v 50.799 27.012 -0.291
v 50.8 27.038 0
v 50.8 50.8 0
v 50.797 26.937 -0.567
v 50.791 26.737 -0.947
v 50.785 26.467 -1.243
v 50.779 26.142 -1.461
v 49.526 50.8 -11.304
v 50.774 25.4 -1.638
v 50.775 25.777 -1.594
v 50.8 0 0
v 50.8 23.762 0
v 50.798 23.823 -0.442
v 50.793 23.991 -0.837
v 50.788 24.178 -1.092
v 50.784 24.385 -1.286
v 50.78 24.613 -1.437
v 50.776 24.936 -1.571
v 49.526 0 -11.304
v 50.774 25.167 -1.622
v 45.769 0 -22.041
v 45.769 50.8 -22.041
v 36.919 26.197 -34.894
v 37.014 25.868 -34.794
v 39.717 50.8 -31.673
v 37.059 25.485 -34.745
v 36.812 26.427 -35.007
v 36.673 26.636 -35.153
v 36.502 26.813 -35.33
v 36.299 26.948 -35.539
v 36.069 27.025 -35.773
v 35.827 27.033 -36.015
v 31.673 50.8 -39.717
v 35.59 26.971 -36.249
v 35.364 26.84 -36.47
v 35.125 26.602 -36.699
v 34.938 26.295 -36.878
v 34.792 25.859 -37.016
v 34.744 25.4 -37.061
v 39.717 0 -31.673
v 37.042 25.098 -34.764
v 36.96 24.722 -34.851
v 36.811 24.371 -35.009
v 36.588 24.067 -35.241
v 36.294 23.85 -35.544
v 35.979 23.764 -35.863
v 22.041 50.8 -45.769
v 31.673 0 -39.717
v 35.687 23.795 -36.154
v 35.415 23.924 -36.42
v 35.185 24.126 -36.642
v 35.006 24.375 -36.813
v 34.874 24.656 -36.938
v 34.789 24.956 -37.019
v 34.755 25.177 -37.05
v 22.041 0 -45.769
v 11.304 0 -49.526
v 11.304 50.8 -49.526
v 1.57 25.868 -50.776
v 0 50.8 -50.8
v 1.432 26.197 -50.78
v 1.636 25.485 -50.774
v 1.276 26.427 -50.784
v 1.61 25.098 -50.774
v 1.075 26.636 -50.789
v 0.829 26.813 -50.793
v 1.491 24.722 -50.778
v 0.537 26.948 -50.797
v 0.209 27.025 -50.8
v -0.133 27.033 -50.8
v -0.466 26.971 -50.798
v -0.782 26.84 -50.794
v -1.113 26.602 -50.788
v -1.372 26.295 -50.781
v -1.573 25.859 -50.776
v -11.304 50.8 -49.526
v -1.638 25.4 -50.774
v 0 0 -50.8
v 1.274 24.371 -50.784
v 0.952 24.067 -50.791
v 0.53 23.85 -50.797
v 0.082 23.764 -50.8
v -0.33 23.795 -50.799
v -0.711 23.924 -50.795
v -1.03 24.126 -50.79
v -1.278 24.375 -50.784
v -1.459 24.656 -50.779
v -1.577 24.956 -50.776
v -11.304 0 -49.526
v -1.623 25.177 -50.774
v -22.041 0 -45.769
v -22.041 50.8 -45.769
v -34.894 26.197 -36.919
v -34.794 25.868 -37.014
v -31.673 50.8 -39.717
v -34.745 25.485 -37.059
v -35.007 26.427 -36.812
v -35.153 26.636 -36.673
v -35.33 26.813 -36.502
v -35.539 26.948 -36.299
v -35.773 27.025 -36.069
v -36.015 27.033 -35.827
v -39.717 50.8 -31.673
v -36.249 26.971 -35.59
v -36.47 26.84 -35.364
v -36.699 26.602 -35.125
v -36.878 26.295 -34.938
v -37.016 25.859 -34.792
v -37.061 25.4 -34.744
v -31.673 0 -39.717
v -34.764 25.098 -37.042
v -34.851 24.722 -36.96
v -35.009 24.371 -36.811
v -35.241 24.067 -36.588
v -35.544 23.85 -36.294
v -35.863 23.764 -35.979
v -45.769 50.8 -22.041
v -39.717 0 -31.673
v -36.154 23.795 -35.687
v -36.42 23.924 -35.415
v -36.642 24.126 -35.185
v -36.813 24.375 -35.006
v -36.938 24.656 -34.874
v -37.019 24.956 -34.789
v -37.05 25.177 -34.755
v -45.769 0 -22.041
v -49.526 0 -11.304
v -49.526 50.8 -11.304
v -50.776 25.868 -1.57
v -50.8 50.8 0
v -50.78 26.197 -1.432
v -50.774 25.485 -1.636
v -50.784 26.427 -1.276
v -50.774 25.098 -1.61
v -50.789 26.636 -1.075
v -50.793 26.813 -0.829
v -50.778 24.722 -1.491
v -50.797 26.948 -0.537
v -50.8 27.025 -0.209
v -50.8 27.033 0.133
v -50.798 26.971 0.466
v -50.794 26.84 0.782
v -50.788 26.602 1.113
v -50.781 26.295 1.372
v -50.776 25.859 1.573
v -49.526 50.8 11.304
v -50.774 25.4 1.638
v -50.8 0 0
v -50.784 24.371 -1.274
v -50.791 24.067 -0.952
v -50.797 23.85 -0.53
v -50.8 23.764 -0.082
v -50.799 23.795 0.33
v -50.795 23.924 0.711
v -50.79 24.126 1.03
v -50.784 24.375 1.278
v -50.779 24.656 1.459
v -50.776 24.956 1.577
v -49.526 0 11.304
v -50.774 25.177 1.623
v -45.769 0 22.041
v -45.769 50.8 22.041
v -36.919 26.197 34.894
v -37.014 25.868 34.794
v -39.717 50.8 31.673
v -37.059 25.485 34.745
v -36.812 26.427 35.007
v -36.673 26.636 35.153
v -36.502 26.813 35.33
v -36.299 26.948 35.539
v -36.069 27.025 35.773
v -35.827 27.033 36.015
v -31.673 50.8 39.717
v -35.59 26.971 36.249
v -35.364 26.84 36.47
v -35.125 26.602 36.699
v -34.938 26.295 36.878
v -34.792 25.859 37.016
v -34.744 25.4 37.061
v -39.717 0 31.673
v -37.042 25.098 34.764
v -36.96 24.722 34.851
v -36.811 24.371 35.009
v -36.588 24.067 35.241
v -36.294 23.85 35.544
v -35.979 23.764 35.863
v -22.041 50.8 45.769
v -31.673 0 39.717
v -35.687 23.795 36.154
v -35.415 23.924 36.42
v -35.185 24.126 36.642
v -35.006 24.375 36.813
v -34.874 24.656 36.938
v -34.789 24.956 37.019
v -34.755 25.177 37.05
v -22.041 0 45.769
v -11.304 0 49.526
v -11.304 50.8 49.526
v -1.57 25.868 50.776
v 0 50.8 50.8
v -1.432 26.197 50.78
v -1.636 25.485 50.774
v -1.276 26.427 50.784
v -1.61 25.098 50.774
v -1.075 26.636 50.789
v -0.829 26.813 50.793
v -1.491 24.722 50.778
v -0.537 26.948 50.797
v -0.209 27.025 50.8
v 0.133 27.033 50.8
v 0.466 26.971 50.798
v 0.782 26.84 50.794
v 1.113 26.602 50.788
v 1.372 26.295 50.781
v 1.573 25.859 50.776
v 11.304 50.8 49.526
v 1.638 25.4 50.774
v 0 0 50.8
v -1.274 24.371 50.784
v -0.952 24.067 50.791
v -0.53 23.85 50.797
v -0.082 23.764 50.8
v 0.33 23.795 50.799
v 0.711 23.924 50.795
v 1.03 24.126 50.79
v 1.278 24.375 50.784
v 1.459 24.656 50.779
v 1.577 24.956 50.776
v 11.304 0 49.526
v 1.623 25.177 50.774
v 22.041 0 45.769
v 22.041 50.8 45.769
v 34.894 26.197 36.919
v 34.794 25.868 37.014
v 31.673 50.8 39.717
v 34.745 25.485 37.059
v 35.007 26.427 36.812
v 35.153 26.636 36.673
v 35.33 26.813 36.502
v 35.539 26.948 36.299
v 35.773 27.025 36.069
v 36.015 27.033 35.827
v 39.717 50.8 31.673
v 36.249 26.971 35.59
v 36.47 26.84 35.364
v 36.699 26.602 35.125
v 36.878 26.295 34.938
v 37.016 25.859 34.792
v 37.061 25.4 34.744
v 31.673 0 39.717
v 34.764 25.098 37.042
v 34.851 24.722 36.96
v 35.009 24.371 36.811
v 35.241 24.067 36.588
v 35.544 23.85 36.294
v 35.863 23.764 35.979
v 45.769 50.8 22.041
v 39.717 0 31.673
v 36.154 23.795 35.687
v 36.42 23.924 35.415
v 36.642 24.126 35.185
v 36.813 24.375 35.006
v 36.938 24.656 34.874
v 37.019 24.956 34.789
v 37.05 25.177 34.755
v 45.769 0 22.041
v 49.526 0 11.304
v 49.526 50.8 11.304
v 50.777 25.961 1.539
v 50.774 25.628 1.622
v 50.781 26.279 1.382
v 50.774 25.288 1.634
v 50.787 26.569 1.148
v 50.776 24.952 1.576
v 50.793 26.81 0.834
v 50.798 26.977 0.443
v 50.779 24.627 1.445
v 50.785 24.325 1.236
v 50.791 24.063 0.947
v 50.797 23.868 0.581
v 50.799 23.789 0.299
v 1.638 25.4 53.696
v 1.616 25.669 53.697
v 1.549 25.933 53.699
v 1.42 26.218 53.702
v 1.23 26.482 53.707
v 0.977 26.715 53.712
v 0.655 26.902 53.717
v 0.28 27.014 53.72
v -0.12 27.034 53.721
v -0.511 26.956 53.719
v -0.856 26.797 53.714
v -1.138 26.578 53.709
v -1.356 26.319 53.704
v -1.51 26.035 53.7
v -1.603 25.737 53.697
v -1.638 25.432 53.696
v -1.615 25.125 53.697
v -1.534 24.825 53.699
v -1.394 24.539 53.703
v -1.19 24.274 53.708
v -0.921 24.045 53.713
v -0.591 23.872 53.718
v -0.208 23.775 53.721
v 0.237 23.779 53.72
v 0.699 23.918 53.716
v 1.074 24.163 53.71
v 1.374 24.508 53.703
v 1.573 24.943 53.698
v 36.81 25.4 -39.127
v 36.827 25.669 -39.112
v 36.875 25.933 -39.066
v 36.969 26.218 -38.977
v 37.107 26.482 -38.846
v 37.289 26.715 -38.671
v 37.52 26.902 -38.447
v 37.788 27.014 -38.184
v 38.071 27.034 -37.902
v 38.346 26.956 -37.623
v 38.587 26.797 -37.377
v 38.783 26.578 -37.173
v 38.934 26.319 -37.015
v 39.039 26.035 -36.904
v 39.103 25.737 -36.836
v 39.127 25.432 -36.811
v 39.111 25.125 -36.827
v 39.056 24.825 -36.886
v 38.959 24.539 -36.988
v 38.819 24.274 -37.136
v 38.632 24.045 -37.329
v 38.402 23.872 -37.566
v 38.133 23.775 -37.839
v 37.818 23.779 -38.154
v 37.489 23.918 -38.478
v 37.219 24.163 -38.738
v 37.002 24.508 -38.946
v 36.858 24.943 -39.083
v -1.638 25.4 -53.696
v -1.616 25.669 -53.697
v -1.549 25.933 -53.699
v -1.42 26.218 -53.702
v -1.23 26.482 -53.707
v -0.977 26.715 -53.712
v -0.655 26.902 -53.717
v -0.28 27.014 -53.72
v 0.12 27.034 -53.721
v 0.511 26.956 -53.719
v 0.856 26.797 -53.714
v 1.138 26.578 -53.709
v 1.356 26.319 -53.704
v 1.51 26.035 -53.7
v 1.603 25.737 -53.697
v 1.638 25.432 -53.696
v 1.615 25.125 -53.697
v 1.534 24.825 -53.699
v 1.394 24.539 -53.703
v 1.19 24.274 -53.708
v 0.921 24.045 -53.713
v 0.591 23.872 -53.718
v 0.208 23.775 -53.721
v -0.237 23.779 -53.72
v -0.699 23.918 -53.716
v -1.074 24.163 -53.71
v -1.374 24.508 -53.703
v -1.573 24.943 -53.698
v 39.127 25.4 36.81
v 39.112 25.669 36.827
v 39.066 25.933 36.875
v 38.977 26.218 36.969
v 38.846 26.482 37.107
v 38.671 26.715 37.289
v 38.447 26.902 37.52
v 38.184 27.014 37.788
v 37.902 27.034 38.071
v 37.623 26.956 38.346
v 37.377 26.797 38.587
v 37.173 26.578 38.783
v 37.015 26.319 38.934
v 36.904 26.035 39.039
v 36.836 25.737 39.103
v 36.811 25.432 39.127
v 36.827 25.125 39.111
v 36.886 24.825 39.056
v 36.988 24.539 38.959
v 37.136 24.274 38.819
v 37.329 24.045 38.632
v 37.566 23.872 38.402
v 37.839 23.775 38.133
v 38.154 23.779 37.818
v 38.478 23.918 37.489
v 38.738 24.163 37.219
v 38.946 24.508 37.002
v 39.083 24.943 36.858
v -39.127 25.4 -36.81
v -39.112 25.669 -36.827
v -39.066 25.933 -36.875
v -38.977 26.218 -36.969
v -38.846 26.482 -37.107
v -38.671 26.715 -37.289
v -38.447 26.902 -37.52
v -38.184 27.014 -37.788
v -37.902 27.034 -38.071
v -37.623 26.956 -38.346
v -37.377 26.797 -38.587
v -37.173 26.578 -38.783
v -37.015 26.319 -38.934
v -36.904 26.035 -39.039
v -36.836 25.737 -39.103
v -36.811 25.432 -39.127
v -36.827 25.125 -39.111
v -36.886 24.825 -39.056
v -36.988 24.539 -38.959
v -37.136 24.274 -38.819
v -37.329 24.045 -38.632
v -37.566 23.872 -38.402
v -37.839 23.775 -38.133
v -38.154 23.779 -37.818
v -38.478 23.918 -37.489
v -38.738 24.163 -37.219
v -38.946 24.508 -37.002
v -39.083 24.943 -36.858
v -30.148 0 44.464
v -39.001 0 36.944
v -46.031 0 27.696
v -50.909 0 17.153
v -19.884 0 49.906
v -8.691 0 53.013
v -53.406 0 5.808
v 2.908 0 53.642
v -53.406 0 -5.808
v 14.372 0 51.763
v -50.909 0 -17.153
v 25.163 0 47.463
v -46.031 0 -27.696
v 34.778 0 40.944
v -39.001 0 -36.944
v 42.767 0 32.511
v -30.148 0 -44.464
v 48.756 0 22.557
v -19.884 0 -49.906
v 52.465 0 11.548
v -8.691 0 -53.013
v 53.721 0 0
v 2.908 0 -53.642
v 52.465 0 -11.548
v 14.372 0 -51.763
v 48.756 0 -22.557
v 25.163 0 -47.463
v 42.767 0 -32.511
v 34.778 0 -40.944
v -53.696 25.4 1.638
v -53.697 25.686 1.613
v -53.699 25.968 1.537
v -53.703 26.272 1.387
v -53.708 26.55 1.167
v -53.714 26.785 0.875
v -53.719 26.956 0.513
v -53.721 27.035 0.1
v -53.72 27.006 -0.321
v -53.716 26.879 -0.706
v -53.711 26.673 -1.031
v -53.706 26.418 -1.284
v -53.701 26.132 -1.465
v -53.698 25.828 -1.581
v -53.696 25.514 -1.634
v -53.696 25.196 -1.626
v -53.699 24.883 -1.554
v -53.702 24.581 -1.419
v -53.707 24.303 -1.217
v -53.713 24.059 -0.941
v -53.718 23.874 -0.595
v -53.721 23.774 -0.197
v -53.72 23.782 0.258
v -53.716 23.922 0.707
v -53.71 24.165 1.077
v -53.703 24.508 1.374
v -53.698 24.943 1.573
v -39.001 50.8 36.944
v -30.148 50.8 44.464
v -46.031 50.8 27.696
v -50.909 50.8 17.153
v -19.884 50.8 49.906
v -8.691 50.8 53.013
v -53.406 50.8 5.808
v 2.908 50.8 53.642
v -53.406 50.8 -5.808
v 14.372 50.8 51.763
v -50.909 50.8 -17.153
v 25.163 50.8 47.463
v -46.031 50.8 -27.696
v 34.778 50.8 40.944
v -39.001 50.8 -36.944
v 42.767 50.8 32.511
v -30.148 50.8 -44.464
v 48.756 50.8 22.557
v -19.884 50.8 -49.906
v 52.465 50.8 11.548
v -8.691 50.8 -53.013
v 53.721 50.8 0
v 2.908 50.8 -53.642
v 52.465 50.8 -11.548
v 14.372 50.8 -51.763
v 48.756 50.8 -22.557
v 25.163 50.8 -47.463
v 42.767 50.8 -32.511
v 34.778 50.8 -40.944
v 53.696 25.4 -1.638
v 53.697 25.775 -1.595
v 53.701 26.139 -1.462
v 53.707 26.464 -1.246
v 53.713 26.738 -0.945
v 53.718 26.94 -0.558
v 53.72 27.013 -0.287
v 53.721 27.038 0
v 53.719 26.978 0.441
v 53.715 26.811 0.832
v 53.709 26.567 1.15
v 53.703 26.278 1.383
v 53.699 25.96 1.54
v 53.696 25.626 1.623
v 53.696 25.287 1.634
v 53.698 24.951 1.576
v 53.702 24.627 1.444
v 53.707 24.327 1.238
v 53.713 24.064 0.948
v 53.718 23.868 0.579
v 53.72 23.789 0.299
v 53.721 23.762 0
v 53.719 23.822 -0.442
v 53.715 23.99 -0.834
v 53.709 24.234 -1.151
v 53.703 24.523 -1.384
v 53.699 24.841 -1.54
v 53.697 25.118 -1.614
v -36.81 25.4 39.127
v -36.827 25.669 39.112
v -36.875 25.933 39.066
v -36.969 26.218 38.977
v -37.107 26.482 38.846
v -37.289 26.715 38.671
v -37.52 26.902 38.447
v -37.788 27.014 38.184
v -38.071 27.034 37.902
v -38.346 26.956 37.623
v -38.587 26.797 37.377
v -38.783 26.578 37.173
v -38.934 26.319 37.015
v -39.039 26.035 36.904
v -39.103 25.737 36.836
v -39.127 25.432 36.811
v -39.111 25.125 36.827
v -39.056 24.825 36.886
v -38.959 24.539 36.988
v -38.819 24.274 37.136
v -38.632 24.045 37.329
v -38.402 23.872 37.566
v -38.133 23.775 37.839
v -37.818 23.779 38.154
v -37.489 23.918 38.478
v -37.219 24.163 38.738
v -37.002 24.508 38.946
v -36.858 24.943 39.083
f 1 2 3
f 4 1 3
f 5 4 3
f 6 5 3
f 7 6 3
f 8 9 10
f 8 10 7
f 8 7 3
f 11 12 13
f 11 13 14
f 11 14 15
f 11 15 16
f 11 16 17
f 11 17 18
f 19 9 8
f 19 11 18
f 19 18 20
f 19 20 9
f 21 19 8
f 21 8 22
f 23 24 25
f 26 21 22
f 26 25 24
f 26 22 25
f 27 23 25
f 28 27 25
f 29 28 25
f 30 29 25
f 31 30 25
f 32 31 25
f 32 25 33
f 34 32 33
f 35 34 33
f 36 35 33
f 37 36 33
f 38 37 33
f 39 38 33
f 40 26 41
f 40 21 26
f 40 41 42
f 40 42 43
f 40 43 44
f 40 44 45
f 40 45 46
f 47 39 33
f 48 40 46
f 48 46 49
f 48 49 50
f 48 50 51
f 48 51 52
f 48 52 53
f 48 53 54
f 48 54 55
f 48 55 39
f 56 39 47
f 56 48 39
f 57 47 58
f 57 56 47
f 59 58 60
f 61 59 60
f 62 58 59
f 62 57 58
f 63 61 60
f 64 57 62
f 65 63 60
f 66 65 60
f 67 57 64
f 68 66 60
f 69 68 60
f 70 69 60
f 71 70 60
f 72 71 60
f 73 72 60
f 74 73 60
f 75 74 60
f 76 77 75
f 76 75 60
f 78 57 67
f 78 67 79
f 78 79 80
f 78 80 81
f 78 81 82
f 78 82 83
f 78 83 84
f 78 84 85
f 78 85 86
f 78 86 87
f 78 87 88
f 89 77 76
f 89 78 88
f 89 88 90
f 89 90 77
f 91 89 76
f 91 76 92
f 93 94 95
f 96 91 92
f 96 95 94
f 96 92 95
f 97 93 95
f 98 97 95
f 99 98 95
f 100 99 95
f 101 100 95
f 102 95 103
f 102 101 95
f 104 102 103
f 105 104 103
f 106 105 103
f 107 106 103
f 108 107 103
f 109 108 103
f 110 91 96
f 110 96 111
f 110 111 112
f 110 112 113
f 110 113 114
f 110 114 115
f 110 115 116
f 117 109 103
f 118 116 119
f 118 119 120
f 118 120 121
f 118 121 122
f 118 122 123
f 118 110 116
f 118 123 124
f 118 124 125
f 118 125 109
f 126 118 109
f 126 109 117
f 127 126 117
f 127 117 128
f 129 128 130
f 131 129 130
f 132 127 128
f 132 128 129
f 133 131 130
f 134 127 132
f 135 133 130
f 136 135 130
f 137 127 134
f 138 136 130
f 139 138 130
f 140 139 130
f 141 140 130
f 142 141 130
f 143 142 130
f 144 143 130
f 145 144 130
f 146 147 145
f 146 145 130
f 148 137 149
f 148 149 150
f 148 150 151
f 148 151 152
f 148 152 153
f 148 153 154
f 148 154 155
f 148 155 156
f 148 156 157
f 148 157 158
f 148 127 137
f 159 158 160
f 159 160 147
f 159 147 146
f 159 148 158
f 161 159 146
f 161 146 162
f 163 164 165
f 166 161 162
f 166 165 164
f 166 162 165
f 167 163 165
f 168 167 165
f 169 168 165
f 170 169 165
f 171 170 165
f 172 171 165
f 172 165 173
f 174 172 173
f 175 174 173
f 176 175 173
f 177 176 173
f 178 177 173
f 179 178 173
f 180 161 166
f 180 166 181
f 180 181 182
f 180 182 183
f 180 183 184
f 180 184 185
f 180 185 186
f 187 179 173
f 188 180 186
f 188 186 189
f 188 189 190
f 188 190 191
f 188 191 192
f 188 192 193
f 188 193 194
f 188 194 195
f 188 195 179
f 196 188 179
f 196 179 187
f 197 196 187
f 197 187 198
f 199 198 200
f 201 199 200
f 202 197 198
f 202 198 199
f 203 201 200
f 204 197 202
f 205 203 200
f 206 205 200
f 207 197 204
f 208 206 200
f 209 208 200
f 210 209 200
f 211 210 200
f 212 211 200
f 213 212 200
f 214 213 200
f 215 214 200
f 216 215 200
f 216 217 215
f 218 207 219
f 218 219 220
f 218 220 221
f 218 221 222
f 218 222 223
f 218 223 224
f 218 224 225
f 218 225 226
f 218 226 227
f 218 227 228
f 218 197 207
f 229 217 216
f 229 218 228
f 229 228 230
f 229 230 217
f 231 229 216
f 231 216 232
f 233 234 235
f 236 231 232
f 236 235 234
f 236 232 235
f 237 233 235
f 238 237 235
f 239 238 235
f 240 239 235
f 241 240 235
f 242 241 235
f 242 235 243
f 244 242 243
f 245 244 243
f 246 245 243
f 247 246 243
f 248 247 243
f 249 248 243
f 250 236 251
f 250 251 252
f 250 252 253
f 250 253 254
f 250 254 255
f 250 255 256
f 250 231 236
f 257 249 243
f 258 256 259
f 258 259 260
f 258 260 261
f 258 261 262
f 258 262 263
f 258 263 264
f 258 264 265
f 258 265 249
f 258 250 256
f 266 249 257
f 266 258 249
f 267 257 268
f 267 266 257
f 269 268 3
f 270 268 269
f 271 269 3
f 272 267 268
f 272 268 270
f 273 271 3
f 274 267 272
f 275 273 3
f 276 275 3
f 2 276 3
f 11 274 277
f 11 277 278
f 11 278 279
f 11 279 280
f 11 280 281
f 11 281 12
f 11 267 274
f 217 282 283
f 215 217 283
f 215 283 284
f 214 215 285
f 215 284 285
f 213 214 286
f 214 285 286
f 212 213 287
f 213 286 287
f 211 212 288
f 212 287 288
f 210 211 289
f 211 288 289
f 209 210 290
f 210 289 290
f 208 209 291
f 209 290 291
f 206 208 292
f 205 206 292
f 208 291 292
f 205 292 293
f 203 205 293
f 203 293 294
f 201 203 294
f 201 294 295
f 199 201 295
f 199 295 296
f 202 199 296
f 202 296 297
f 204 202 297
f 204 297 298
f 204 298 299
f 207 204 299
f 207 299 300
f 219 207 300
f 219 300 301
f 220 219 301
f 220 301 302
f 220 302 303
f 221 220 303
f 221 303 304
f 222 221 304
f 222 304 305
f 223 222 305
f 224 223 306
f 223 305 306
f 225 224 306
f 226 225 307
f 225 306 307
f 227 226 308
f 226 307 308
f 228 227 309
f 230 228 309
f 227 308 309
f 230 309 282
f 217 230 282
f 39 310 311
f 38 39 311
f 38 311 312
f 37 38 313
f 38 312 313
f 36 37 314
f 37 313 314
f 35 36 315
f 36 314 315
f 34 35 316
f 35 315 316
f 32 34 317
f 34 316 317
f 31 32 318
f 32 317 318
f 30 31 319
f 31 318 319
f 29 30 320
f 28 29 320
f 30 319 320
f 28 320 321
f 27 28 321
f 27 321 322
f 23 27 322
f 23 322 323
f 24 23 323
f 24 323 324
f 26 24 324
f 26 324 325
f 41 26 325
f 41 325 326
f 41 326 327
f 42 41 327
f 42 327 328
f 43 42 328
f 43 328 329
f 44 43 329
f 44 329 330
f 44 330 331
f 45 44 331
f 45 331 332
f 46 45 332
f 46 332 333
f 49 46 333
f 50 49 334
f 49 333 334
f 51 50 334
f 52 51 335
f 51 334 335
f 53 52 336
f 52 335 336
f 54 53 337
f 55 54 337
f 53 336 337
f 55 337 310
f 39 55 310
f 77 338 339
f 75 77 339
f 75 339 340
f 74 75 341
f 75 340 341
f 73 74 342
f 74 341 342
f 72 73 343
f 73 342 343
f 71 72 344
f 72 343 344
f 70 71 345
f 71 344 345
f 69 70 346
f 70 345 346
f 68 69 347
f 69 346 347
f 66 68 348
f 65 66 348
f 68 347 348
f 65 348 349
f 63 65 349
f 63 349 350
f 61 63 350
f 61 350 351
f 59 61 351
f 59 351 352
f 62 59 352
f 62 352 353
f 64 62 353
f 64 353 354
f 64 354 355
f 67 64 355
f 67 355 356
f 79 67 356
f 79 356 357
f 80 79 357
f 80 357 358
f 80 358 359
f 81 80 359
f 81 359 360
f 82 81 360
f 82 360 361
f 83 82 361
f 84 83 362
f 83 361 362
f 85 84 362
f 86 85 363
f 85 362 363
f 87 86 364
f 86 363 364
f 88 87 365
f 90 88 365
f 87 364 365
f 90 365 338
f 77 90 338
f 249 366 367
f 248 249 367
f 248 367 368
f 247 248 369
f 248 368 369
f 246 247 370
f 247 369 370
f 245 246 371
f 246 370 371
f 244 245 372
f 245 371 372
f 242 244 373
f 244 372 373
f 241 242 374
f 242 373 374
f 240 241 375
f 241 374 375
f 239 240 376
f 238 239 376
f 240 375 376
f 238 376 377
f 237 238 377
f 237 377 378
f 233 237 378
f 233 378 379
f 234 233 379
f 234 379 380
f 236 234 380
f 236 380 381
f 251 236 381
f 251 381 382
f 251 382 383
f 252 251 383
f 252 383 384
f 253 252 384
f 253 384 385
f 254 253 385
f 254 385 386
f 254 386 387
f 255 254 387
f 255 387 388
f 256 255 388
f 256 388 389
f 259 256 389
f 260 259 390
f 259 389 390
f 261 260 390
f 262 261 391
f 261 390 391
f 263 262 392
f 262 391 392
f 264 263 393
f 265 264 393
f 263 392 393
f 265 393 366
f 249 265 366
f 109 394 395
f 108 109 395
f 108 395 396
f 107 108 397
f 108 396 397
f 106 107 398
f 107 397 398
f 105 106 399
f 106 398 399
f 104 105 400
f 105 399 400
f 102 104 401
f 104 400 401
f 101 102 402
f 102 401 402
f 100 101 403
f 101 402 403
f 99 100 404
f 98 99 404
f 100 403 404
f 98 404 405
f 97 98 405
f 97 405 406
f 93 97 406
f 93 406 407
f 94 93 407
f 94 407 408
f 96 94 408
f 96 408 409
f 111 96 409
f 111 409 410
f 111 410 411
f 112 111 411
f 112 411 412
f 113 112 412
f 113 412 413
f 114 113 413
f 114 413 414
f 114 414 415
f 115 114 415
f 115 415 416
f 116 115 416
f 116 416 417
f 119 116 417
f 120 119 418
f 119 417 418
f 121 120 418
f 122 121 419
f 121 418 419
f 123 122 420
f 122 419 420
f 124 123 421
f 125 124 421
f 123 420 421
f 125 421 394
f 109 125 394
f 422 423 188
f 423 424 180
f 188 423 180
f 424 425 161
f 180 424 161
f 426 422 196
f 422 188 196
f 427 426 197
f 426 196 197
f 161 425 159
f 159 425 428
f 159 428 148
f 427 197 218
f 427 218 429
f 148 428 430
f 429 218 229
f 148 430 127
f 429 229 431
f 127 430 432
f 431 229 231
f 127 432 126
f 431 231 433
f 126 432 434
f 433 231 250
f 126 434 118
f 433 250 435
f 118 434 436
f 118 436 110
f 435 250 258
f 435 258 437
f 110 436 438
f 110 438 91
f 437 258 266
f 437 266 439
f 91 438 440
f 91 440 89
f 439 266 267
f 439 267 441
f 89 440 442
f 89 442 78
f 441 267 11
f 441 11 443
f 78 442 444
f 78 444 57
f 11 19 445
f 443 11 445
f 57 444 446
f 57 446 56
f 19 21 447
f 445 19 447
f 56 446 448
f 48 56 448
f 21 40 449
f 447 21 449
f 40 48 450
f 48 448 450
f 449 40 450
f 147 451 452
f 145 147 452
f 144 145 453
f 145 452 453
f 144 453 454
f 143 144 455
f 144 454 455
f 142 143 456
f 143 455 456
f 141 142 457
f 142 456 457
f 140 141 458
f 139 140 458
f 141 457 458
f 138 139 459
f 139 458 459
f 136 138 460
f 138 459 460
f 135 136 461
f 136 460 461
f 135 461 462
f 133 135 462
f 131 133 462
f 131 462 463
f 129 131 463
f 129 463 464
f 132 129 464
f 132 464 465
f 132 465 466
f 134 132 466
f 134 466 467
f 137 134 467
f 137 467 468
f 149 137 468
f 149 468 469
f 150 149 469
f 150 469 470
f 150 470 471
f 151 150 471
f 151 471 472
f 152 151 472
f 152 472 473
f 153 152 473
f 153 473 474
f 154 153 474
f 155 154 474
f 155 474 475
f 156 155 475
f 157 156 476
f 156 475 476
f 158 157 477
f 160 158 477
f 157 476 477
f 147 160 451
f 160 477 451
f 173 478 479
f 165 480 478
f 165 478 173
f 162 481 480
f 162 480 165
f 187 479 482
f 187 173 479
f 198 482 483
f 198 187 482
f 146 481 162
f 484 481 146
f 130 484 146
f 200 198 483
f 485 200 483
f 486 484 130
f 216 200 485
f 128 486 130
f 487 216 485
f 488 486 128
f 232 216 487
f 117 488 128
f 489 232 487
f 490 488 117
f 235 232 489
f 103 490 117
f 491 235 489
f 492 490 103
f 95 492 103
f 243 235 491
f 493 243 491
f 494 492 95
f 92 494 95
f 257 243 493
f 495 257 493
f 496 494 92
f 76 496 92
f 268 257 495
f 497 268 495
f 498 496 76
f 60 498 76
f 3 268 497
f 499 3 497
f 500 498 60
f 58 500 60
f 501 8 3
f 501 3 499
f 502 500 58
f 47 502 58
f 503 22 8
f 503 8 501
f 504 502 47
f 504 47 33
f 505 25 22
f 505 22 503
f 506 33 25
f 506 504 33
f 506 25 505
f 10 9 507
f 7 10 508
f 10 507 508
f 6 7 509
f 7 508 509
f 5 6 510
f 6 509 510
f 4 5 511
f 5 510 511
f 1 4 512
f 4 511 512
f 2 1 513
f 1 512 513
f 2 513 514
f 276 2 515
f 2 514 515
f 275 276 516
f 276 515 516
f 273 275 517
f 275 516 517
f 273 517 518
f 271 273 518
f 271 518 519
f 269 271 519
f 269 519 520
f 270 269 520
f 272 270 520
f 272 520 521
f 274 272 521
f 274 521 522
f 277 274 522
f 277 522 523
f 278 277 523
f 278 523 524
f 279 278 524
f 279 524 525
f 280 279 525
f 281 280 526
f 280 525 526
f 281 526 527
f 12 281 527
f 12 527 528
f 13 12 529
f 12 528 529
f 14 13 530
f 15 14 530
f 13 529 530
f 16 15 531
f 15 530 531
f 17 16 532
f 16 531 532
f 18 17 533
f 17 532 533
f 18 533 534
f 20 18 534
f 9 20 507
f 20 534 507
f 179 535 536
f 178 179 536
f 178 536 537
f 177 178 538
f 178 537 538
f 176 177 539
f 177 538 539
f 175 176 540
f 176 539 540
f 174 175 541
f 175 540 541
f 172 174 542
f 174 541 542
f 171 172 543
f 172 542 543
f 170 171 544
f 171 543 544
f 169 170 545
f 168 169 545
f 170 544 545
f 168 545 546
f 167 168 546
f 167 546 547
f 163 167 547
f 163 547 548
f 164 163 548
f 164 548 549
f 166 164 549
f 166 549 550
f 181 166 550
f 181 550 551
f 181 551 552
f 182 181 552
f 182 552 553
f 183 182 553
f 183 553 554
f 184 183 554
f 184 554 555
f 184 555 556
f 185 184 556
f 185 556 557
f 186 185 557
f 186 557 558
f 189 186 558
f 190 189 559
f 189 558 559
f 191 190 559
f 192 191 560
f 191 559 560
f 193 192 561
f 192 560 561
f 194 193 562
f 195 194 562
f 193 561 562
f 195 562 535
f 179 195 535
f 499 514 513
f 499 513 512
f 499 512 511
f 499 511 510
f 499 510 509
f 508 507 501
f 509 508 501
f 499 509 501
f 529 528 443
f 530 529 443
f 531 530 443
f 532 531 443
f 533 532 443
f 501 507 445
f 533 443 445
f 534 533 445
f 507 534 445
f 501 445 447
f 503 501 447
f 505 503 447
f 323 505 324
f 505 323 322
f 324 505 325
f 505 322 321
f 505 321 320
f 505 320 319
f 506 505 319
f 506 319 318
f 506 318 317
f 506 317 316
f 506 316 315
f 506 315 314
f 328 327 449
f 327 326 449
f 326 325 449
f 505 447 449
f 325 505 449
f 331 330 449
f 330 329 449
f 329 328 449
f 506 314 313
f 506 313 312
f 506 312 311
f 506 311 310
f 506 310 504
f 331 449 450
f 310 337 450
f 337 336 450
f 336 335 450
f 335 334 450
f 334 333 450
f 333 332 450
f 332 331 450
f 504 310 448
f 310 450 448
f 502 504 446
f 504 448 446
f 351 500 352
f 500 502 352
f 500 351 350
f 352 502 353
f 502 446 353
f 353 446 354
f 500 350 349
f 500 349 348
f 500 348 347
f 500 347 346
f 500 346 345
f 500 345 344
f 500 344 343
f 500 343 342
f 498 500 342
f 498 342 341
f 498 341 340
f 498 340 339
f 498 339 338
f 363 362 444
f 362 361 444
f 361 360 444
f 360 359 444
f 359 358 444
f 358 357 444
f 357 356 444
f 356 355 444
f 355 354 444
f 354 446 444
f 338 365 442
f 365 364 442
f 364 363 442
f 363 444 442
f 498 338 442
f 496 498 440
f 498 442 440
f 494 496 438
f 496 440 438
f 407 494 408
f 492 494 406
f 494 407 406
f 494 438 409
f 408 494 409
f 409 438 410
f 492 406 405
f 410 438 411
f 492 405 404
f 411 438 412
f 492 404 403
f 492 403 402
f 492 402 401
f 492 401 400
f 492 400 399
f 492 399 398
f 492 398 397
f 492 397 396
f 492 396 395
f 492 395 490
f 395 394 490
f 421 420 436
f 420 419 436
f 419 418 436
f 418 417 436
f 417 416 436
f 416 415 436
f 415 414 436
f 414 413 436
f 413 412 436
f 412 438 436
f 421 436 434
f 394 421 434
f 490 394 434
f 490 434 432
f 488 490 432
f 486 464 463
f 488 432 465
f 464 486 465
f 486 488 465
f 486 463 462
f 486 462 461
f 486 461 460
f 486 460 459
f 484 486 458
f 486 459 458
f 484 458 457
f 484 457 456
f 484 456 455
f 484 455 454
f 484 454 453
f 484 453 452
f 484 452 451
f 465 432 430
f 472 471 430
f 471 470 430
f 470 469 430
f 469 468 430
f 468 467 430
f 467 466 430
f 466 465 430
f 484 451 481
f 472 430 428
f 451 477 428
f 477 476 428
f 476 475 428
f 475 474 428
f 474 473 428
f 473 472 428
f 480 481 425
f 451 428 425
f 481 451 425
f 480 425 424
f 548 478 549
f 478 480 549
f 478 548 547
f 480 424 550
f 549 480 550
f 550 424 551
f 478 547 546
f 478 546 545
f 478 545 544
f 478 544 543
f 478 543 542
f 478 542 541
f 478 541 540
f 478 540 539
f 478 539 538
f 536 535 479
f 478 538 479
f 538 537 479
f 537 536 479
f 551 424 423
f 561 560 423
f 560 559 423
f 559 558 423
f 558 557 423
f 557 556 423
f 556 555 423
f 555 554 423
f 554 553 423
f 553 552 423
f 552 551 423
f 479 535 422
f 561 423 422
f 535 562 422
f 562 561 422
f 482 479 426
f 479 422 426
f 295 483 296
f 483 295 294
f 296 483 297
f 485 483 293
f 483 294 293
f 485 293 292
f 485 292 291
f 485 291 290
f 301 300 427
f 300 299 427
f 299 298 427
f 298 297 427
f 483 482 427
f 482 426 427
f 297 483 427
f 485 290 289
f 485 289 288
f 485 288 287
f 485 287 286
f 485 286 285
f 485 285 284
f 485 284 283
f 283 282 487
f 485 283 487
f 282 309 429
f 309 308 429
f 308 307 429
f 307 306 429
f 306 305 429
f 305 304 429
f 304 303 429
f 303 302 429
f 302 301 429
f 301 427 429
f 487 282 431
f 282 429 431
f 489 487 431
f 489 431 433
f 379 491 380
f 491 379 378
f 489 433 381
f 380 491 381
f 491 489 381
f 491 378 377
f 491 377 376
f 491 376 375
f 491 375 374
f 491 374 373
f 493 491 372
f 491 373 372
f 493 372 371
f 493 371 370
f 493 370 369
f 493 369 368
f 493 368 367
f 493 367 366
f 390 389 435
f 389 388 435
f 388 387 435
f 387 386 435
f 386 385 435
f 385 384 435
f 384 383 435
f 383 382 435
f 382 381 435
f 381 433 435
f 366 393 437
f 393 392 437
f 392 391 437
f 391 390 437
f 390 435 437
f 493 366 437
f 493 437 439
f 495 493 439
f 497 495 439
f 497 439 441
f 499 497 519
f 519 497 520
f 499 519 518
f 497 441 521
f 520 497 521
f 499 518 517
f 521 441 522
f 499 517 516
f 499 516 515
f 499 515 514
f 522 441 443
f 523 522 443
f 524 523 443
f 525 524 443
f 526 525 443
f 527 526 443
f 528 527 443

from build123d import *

# Parameters (mm, degrees)
SKETCH1_R               = 53.721
SKETCH1_R_2             = 50.8
EXTRUDE_THIN1_DEPTH     = 50.8
CUT_EXTRUDE1_REACH      = 132.424
CUT_EXTRUDE1_END_RADIUS = 50.8
SKETCH2_R               = 1.6383
CIRPATTERN1_COUNT       = 8


with BuildPart() as part:
    # Sketch1 → Extrude-Thin1 (new body)
    with BuildSketch(Plane(origin=(0, 0, 0), x_dir=(1, 0, 0), z_dir=(0, 1, 0))):
        Circle(SKETCH1_R)
        Circle(SKETCH1_R_2, mode=Mode.SUBTRACT)
    extrude(amount=EXTRUDE_THIN1_DEPTH)

    # Cut-Extrude1: up to this cylinder (the profile starts outside it)
    cut_extrude1_end = Plane(origin=(0, 25.4, 0), z_dir=(0, -1, 0)) * Cylinder(CUT_EXTRUDE1_END_RADIUS, 367.448, mode=Mode.PRIVATE)
    # Sketch2 → Cut-Extrude1 (cut, up to the surface)
    with BuildSketch(Plane.XY.offset(53.721), mode=Mode.PRIVATE) as cut_extrude1_sk1:
        with Locations((0, 25.4)):
            Circle(SKETCH2_R)
    cut_extrude1_tool1 = extrude(cut_extrude1_sk1.sketch, amount=-CUT_EXTRUDE1_REACH, mode=Mode.PRIVATE) - cut_extrude1_end
    cut_extrude1 = cut_extrude1_tool1.solids().sort_by_distance((0, 25.4, 53.721))[0]
    add(cut_extrude1, mode=Mode.SUBTRACT)

    # CirPattern1: Cut-Extrude1 ×8 about axis
    cirpattern1_axis = Axis((0, 50.8, 0), (0, -1, 0))
    for i in range(1, CIRPATTERN1_COUNT):
        add(cut_extrude1.rotate(cirpattern1_axis, i * 360 / CIRPATTERN1_COUNT), mode=Mode.SUBTRACT)


solid = part.part
